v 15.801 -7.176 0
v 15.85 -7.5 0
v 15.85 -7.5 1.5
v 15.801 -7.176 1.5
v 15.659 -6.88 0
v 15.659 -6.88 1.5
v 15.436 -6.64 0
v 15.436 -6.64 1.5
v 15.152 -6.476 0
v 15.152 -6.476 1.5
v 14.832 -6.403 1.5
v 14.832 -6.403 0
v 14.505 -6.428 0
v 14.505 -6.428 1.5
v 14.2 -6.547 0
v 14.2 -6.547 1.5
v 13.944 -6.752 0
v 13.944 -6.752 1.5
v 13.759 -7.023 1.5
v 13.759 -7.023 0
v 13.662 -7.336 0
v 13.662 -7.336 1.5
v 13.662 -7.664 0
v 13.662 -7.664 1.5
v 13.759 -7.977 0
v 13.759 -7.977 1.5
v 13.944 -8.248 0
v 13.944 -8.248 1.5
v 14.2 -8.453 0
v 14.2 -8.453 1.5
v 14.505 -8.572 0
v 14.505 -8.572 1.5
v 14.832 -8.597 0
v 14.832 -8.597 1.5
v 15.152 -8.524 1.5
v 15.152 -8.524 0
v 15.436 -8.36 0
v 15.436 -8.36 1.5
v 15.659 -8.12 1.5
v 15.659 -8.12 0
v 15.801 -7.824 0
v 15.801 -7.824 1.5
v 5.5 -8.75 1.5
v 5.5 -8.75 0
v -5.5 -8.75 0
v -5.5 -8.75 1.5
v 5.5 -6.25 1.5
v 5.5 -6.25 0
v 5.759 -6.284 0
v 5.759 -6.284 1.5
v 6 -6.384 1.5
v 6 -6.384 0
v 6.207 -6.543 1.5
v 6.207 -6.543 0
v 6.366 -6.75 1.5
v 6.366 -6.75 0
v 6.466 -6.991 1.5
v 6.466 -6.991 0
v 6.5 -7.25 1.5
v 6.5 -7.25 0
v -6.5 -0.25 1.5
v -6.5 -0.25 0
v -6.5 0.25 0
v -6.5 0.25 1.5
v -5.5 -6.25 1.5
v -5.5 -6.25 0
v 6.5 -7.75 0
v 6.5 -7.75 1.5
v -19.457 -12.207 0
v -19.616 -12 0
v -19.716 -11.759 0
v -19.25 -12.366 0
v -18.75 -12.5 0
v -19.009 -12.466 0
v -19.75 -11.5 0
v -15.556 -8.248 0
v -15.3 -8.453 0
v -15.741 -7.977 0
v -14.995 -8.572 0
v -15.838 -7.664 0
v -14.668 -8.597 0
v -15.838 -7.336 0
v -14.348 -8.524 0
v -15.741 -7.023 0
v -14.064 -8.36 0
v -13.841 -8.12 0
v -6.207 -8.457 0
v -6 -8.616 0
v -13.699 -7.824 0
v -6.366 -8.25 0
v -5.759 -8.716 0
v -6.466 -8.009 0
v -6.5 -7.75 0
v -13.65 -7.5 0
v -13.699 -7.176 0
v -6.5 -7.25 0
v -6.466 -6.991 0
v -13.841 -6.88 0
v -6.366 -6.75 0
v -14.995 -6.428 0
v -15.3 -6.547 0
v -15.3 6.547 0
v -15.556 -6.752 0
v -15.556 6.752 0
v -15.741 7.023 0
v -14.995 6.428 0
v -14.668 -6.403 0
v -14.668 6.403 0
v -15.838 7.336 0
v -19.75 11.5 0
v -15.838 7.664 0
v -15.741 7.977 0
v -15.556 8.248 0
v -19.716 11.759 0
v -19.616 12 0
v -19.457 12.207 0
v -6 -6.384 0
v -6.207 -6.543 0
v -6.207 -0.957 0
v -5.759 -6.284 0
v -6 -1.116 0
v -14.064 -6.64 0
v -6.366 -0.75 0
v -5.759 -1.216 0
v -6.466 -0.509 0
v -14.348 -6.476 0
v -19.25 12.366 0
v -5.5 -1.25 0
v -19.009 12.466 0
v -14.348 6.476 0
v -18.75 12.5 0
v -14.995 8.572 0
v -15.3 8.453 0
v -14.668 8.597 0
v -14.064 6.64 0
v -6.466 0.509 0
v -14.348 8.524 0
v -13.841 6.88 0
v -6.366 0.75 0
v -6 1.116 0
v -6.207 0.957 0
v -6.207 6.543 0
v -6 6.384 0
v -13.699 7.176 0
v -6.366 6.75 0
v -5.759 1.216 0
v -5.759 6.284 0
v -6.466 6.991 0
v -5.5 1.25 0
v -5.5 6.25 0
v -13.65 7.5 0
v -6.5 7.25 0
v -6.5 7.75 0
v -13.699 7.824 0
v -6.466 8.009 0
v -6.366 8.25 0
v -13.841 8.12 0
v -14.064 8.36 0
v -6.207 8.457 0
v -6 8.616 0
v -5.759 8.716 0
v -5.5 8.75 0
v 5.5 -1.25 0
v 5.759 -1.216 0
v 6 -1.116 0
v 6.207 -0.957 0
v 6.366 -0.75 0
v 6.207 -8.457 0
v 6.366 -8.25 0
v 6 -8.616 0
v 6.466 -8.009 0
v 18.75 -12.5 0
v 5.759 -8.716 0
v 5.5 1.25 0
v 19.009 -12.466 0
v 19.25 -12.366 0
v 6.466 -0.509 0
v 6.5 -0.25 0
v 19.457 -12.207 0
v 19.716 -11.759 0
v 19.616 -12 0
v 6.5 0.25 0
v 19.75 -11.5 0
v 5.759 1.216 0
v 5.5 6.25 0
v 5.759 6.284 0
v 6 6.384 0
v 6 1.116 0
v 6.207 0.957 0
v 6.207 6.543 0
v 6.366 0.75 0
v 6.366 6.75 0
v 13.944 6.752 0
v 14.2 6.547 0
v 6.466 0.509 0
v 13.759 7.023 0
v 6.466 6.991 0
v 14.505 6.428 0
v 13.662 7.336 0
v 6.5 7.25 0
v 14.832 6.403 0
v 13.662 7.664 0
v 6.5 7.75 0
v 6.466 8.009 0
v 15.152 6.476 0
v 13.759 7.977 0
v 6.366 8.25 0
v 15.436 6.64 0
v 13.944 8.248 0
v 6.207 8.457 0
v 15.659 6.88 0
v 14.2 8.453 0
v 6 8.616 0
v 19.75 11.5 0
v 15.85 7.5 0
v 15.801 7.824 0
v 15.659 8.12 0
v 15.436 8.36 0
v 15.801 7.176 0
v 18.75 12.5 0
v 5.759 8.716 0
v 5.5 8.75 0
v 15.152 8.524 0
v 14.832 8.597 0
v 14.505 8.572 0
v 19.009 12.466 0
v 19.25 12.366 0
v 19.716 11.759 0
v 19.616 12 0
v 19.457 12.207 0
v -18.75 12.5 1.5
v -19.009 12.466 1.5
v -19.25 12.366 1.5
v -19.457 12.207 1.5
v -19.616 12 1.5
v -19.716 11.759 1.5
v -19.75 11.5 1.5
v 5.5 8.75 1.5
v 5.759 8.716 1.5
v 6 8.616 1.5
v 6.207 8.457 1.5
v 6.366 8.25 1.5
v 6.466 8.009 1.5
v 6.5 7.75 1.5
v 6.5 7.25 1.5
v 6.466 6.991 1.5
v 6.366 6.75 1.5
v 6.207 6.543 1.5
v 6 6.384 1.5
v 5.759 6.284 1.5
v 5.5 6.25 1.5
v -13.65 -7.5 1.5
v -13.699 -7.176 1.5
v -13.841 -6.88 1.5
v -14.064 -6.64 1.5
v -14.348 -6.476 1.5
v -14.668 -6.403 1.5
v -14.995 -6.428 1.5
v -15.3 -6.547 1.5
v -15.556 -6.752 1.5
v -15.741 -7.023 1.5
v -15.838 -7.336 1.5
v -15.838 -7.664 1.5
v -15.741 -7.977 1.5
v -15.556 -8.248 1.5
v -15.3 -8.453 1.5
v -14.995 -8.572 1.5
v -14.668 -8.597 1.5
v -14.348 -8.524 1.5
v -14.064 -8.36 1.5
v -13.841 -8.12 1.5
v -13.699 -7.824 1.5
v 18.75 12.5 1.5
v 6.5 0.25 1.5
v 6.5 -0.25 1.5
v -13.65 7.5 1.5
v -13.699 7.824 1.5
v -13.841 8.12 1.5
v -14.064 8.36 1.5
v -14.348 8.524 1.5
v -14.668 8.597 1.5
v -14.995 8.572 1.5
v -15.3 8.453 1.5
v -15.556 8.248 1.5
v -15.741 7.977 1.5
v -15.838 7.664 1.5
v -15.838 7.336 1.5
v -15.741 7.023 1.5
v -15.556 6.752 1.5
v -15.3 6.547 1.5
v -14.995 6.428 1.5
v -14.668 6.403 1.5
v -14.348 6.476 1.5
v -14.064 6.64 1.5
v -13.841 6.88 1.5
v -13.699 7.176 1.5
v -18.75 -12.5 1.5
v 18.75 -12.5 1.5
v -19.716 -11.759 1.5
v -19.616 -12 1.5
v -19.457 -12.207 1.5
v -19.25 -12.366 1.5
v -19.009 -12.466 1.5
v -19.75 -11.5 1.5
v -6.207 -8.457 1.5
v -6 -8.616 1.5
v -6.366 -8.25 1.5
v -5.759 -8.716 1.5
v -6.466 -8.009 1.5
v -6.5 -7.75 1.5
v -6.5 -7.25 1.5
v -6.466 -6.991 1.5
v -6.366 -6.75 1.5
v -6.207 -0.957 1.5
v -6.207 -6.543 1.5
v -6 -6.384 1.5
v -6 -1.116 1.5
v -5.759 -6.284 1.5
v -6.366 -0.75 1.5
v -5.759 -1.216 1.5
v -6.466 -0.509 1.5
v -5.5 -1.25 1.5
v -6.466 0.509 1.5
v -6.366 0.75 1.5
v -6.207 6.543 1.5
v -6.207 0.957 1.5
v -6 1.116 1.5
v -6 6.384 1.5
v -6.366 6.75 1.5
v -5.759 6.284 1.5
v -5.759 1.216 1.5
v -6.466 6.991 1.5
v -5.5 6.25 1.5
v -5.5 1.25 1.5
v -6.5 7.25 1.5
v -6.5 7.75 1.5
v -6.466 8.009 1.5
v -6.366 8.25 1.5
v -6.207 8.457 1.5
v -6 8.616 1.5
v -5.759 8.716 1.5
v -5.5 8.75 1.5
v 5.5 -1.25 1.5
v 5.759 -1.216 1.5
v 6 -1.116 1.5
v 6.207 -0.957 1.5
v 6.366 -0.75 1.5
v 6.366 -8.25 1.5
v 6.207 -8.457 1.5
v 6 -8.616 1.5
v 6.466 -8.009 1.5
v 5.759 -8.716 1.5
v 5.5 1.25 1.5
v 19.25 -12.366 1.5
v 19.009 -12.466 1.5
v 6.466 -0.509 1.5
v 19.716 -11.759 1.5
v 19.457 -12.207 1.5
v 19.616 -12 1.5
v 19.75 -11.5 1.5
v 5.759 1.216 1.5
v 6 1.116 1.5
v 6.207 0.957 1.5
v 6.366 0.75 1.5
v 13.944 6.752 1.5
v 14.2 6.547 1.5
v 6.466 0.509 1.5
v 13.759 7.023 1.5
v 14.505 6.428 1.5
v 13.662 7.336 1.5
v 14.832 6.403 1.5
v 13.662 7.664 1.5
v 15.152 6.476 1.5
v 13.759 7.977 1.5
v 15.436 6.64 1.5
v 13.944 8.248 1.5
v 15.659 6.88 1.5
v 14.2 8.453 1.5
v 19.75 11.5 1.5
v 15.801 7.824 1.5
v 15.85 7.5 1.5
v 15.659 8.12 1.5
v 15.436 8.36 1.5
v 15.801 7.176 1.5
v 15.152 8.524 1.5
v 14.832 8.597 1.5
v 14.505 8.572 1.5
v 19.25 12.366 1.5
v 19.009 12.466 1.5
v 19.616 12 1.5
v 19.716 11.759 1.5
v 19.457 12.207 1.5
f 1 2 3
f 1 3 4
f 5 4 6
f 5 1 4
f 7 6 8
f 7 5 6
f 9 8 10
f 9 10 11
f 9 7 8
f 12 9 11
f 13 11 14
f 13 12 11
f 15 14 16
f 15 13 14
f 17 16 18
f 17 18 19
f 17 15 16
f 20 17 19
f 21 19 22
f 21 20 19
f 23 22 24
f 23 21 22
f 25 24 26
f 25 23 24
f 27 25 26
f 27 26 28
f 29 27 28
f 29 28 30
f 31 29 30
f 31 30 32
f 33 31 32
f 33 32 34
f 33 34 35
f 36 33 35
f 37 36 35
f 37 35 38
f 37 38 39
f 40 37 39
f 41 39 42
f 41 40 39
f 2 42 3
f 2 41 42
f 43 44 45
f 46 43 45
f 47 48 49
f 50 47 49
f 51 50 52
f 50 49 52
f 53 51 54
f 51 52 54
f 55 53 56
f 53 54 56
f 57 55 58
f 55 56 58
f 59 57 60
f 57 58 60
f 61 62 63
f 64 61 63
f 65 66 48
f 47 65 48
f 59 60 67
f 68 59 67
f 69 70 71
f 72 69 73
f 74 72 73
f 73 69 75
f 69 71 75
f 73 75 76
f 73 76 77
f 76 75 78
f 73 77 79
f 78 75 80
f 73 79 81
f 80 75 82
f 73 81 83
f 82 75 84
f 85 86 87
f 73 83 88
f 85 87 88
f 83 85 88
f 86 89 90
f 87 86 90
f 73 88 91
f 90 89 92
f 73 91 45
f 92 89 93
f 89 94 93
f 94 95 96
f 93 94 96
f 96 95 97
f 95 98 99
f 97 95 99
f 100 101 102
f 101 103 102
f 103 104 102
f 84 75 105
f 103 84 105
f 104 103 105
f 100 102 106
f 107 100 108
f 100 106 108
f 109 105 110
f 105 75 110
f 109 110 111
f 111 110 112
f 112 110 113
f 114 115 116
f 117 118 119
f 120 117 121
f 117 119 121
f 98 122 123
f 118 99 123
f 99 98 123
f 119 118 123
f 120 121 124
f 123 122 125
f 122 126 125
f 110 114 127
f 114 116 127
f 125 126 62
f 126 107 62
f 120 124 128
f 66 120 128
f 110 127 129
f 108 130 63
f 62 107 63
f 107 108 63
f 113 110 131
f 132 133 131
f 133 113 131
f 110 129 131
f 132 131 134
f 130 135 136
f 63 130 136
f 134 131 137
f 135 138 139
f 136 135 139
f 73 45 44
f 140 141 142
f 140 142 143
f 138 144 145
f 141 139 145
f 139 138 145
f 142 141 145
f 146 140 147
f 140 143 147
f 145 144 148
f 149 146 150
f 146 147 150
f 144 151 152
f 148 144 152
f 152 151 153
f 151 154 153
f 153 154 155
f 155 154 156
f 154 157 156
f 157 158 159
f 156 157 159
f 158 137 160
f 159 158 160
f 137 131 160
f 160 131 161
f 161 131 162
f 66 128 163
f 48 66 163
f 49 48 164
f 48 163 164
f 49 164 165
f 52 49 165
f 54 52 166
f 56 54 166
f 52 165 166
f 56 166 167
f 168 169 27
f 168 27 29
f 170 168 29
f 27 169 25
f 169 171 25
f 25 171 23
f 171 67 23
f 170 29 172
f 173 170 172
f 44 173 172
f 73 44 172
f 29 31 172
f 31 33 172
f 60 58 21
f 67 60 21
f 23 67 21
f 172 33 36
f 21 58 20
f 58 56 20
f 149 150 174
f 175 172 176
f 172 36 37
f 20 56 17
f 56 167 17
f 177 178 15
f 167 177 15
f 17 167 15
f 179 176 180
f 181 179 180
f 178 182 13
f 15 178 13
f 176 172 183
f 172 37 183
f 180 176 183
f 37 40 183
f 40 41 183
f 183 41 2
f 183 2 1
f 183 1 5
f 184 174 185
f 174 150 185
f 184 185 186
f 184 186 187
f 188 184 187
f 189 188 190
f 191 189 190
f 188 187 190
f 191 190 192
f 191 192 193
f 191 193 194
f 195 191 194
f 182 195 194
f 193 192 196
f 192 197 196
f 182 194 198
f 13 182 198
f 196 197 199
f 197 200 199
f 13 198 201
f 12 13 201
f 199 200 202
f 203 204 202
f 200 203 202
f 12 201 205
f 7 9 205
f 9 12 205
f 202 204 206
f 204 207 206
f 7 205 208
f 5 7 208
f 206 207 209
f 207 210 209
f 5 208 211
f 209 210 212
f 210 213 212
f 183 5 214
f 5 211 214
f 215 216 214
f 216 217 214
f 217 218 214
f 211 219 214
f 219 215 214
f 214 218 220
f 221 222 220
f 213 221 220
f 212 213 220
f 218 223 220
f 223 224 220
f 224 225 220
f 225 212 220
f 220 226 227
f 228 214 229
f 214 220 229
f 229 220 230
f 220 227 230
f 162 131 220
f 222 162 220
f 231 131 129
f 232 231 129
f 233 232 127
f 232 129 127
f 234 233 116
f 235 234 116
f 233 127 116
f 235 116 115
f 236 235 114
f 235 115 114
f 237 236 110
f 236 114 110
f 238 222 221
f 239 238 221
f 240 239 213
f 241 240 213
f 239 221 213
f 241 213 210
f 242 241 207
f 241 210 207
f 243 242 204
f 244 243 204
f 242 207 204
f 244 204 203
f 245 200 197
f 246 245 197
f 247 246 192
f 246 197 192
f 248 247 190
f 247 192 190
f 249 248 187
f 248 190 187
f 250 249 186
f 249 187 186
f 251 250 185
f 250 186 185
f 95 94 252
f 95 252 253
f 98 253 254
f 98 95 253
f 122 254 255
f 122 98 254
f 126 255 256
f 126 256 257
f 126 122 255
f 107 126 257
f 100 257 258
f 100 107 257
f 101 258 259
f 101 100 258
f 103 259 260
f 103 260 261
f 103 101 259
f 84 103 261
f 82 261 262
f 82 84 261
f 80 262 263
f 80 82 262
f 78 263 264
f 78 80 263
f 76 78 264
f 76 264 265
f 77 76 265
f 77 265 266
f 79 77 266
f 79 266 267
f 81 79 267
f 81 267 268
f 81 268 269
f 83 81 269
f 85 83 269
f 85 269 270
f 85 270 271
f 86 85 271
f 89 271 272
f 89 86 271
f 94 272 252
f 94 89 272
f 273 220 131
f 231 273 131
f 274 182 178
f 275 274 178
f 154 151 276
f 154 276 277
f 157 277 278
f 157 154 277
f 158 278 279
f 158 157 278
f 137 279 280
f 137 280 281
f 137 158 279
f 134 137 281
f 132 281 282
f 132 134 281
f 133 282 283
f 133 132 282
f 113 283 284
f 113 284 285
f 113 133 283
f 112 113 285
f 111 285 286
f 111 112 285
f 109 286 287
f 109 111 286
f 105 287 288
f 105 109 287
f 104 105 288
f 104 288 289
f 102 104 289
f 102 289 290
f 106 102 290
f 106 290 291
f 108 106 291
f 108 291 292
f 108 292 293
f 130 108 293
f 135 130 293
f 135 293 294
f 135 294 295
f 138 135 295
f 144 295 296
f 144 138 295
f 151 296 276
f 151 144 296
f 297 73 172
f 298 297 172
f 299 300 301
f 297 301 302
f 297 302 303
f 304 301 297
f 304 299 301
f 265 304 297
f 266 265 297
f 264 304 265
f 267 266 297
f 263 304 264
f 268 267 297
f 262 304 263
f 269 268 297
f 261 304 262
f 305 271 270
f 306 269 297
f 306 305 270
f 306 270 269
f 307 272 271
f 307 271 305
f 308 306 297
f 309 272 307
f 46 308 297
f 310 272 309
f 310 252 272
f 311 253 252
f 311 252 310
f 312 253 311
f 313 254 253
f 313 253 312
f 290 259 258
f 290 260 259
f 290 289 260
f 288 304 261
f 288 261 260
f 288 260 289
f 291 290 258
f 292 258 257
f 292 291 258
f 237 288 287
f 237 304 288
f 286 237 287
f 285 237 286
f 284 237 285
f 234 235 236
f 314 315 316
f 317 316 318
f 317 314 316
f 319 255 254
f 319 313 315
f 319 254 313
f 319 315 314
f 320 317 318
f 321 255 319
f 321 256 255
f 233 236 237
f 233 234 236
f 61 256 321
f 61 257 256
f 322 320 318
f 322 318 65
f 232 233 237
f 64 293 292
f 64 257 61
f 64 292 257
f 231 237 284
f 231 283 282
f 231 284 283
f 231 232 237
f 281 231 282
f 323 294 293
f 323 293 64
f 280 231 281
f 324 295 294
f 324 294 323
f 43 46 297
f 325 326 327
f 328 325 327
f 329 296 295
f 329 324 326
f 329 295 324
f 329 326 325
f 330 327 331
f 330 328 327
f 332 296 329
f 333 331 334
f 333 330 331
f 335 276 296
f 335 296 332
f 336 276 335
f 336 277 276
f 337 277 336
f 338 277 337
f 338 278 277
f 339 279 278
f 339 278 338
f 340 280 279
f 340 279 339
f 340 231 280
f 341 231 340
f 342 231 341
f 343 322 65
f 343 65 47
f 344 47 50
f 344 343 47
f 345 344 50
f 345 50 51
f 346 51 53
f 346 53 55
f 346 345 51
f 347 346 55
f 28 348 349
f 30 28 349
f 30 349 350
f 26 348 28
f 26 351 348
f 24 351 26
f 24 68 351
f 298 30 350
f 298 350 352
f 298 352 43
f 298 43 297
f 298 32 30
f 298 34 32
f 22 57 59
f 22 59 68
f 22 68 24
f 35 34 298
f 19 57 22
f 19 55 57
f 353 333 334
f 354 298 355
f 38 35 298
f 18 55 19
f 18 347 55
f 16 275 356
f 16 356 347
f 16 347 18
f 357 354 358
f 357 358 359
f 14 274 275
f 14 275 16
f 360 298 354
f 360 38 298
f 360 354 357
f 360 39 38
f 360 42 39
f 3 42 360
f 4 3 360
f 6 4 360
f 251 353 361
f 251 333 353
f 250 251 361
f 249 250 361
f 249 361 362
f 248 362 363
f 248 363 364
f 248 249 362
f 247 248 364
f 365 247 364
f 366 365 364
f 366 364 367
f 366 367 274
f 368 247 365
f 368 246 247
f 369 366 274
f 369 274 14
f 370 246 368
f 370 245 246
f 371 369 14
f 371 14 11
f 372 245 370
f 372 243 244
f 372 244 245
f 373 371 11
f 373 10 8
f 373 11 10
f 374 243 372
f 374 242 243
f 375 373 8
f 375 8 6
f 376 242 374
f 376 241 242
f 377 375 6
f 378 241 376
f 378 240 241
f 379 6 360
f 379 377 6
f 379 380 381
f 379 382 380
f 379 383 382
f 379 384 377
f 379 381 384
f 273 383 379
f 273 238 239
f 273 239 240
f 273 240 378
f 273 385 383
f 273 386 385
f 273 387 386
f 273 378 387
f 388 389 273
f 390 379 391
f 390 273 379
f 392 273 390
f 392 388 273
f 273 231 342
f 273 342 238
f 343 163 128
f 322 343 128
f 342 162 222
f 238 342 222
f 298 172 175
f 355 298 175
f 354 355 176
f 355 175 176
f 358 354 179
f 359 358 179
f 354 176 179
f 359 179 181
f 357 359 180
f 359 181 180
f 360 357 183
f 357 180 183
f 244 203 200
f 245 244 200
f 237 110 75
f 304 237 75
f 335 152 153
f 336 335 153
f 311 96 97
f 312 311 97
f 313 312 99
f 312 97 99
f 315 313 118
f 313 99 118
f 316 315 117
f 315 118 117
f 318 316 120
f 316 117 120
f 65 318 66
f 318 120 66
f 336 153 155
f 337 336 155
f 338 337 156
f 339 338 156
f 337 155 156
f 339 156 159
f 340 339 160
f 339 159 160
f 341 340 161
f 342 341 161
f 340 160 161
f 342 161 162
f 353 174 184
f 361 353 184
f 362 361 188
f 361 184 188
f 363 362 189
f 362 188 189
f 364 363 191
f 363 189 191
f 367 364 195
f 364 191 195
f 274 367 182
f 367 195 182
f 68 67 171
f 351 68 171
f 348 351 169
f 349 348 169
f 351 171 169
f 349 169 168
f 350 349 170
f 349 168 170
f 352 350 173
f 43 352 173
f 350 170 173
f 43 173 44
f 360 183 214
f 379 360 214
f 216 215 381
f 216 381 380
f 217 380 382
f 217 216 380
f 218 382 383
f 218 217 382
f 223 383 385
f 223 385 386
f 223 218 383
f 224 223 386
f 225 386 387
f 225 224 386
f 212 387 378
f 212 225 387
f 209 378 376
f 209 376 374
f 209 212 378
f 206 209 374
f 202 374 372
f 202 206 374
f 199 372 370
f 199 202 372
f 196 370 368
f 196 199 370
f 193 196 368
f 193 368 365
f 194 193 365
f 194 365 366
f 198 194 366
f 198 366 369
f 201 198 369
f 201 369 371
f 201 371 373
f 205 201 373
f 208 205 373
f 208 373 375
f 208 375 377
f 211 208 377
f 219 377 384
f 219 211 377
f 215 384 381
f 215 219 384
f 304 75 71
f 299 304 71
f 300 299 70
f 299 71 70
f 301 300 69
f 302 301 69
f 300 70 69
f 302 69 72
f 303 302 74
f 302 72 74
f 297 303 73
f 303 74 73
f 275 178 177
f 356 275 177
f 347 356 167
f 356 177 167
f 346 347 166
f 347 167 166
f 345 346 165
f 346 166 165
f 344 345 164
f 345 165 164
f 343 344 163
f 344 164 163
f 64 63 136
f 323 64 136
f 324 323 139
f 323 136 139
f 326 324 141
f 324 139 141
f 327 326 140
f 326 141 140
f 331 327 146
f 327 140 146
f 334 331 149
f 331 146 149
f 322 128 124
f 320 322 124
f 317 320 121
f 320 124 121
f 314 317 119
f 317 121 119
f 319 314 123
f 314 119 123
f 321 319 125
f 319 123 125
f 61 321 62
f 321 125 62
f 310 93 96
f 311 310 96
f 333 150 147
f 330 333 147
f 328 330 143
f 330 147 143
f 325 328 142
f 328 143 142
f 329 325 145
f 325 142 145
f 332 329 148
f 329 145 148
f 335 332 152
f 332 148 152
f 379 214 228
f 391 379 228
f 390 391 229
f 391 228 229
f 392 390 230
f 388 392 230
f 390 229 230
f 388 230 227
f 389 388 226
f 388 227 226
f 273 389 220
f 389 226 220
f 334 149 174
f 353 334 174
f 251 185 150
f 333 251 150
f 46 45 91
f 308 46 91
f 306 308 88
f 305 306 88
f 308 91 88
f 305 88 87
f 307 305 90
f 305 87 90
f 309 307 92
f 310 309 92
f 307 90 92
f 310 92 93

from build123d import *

# Parameters (mm, degrees)
F0_R     = 1.1
F1_DEPTH = 1.5


with BuildPart() as f1:
    # F0 (on Top) → F1 (new body)
    with BuildSketch(Plane.XY):
        with BuildLine():
            ThreePointArc((19.75, 11.5), (19.457107, 12.207107), (18.75, 12.5))
            Line((18.75, 12.5), (-18.75, 12.5))
            ThreePointArc((-18.75, 12.5), (-19.457107, 12.207107), (-19.75, 11.5))
            Line((-19.75, 11.5), (-19.75, -11.5))
            ThreePointArc((-19.75, -11.5), (-19.457107, -12.207107), (-18.75, -12.5))
            Line((-18.75, -12.5), (18.75, -12.5))
            ThreePointArc((18.75, -12.5), (19.457107, -12.207107), (19.75, -11.5))
            Line((19.75, -11.5), (19.75, 11.5))
        make_face()
        with Locations((-14.75, -7.5)):
            Circle(F0_R, mode=Mode.SUBTRACT)
        with BuildLine():
            ThreePointArc((-5.5, -8.75), (-6.207107, -8.457107), (-6.5, -7.75))
            Line((-6.5, -7.75), (-6.5, -7.25))
            ThreePointArc((-6.5, -7.25), (-6.207107, -6.542893), (-5.5, -6.25))
            Line((-5.5, -6.25), (5.5, -6.25))
            ThreePointArc((5.5, -6.25), (6.207107, -6.542893), (6.5, -7.25))
            Line((6.5, -7.25), (6.5, -7.75))
            ThreePointArc((6.5, -7.75), (6.207107, -8.457107), (5.5, -8.75))
            Line((5.5, -8.75), (-5.5, -8.75))
        make_face(mode=Mode.SUBTRACT)
        with Locations((14.75, -7.5)):
            Circle(F0_R, mode=Mode.SUBTRACT)
        with Locations((-14.75, 7.5)):
            Circle(F0_R, mode=Mode.SUBTRACT)
        with BuildLine():
            ThreePointArc((-6.5, 0.25), (-6.207107, 0.957107), (-5.5, 1.25))
            Line((-5.5, 1.25), (5.5, 1.25))
            ThreePointArc((5.5, 1.25), (6.207107, 0.957107), (6.5, 0.25))
            Line((6.5, 0.25), (6.5, -0.25))
            ThreePointArc((6.5, -0.25), (6.207107, -0.957107), (5.5, -1.25))
            Line((5.5, -1.25), (-5.5, -1.25))
            ThreePointArc((-5.5, -1.25), (-6.207107, -0.957107), (-6.5, -0.25))
            Line((-6.5, -0.25), (-6.5, 0.25))
        make_face(mode=Mode.SUBTRACT)
        with BuildLine():
            ThreePointArc((-6.5, 7.75), (-6.207107, 8.457107), (-5.5, 8.75))
            Line((-5.5, 8.75), (5.5, 8.75))
            ThreePointArc((5.5, 8.75), (6.207107, 8.457107), (6.5, 7.75))
            Line((6.5, 7.75), (6.5, 7.25))
            ThreePointArc((6.5, 7.25), (6.207107, 6.542893), (5.5, 6.25))
            Line((5.5, 6.25), (-5.5, 6.25))
            ThreePointArc((-5.5, 6.25), (-6.207107, 6.542893), (-6.5, 7.25))
            Line((-6.5, 7.25), (-6.5, 7.75))
        make_face(mode=Mode.SUBTRACT)
        with Locations((14.75, 7.5)):
            Circle(F0_R, mode=Mode.SUBTRACT)
    extrude(amount=F1_DEPTH)


solid = f1.part
